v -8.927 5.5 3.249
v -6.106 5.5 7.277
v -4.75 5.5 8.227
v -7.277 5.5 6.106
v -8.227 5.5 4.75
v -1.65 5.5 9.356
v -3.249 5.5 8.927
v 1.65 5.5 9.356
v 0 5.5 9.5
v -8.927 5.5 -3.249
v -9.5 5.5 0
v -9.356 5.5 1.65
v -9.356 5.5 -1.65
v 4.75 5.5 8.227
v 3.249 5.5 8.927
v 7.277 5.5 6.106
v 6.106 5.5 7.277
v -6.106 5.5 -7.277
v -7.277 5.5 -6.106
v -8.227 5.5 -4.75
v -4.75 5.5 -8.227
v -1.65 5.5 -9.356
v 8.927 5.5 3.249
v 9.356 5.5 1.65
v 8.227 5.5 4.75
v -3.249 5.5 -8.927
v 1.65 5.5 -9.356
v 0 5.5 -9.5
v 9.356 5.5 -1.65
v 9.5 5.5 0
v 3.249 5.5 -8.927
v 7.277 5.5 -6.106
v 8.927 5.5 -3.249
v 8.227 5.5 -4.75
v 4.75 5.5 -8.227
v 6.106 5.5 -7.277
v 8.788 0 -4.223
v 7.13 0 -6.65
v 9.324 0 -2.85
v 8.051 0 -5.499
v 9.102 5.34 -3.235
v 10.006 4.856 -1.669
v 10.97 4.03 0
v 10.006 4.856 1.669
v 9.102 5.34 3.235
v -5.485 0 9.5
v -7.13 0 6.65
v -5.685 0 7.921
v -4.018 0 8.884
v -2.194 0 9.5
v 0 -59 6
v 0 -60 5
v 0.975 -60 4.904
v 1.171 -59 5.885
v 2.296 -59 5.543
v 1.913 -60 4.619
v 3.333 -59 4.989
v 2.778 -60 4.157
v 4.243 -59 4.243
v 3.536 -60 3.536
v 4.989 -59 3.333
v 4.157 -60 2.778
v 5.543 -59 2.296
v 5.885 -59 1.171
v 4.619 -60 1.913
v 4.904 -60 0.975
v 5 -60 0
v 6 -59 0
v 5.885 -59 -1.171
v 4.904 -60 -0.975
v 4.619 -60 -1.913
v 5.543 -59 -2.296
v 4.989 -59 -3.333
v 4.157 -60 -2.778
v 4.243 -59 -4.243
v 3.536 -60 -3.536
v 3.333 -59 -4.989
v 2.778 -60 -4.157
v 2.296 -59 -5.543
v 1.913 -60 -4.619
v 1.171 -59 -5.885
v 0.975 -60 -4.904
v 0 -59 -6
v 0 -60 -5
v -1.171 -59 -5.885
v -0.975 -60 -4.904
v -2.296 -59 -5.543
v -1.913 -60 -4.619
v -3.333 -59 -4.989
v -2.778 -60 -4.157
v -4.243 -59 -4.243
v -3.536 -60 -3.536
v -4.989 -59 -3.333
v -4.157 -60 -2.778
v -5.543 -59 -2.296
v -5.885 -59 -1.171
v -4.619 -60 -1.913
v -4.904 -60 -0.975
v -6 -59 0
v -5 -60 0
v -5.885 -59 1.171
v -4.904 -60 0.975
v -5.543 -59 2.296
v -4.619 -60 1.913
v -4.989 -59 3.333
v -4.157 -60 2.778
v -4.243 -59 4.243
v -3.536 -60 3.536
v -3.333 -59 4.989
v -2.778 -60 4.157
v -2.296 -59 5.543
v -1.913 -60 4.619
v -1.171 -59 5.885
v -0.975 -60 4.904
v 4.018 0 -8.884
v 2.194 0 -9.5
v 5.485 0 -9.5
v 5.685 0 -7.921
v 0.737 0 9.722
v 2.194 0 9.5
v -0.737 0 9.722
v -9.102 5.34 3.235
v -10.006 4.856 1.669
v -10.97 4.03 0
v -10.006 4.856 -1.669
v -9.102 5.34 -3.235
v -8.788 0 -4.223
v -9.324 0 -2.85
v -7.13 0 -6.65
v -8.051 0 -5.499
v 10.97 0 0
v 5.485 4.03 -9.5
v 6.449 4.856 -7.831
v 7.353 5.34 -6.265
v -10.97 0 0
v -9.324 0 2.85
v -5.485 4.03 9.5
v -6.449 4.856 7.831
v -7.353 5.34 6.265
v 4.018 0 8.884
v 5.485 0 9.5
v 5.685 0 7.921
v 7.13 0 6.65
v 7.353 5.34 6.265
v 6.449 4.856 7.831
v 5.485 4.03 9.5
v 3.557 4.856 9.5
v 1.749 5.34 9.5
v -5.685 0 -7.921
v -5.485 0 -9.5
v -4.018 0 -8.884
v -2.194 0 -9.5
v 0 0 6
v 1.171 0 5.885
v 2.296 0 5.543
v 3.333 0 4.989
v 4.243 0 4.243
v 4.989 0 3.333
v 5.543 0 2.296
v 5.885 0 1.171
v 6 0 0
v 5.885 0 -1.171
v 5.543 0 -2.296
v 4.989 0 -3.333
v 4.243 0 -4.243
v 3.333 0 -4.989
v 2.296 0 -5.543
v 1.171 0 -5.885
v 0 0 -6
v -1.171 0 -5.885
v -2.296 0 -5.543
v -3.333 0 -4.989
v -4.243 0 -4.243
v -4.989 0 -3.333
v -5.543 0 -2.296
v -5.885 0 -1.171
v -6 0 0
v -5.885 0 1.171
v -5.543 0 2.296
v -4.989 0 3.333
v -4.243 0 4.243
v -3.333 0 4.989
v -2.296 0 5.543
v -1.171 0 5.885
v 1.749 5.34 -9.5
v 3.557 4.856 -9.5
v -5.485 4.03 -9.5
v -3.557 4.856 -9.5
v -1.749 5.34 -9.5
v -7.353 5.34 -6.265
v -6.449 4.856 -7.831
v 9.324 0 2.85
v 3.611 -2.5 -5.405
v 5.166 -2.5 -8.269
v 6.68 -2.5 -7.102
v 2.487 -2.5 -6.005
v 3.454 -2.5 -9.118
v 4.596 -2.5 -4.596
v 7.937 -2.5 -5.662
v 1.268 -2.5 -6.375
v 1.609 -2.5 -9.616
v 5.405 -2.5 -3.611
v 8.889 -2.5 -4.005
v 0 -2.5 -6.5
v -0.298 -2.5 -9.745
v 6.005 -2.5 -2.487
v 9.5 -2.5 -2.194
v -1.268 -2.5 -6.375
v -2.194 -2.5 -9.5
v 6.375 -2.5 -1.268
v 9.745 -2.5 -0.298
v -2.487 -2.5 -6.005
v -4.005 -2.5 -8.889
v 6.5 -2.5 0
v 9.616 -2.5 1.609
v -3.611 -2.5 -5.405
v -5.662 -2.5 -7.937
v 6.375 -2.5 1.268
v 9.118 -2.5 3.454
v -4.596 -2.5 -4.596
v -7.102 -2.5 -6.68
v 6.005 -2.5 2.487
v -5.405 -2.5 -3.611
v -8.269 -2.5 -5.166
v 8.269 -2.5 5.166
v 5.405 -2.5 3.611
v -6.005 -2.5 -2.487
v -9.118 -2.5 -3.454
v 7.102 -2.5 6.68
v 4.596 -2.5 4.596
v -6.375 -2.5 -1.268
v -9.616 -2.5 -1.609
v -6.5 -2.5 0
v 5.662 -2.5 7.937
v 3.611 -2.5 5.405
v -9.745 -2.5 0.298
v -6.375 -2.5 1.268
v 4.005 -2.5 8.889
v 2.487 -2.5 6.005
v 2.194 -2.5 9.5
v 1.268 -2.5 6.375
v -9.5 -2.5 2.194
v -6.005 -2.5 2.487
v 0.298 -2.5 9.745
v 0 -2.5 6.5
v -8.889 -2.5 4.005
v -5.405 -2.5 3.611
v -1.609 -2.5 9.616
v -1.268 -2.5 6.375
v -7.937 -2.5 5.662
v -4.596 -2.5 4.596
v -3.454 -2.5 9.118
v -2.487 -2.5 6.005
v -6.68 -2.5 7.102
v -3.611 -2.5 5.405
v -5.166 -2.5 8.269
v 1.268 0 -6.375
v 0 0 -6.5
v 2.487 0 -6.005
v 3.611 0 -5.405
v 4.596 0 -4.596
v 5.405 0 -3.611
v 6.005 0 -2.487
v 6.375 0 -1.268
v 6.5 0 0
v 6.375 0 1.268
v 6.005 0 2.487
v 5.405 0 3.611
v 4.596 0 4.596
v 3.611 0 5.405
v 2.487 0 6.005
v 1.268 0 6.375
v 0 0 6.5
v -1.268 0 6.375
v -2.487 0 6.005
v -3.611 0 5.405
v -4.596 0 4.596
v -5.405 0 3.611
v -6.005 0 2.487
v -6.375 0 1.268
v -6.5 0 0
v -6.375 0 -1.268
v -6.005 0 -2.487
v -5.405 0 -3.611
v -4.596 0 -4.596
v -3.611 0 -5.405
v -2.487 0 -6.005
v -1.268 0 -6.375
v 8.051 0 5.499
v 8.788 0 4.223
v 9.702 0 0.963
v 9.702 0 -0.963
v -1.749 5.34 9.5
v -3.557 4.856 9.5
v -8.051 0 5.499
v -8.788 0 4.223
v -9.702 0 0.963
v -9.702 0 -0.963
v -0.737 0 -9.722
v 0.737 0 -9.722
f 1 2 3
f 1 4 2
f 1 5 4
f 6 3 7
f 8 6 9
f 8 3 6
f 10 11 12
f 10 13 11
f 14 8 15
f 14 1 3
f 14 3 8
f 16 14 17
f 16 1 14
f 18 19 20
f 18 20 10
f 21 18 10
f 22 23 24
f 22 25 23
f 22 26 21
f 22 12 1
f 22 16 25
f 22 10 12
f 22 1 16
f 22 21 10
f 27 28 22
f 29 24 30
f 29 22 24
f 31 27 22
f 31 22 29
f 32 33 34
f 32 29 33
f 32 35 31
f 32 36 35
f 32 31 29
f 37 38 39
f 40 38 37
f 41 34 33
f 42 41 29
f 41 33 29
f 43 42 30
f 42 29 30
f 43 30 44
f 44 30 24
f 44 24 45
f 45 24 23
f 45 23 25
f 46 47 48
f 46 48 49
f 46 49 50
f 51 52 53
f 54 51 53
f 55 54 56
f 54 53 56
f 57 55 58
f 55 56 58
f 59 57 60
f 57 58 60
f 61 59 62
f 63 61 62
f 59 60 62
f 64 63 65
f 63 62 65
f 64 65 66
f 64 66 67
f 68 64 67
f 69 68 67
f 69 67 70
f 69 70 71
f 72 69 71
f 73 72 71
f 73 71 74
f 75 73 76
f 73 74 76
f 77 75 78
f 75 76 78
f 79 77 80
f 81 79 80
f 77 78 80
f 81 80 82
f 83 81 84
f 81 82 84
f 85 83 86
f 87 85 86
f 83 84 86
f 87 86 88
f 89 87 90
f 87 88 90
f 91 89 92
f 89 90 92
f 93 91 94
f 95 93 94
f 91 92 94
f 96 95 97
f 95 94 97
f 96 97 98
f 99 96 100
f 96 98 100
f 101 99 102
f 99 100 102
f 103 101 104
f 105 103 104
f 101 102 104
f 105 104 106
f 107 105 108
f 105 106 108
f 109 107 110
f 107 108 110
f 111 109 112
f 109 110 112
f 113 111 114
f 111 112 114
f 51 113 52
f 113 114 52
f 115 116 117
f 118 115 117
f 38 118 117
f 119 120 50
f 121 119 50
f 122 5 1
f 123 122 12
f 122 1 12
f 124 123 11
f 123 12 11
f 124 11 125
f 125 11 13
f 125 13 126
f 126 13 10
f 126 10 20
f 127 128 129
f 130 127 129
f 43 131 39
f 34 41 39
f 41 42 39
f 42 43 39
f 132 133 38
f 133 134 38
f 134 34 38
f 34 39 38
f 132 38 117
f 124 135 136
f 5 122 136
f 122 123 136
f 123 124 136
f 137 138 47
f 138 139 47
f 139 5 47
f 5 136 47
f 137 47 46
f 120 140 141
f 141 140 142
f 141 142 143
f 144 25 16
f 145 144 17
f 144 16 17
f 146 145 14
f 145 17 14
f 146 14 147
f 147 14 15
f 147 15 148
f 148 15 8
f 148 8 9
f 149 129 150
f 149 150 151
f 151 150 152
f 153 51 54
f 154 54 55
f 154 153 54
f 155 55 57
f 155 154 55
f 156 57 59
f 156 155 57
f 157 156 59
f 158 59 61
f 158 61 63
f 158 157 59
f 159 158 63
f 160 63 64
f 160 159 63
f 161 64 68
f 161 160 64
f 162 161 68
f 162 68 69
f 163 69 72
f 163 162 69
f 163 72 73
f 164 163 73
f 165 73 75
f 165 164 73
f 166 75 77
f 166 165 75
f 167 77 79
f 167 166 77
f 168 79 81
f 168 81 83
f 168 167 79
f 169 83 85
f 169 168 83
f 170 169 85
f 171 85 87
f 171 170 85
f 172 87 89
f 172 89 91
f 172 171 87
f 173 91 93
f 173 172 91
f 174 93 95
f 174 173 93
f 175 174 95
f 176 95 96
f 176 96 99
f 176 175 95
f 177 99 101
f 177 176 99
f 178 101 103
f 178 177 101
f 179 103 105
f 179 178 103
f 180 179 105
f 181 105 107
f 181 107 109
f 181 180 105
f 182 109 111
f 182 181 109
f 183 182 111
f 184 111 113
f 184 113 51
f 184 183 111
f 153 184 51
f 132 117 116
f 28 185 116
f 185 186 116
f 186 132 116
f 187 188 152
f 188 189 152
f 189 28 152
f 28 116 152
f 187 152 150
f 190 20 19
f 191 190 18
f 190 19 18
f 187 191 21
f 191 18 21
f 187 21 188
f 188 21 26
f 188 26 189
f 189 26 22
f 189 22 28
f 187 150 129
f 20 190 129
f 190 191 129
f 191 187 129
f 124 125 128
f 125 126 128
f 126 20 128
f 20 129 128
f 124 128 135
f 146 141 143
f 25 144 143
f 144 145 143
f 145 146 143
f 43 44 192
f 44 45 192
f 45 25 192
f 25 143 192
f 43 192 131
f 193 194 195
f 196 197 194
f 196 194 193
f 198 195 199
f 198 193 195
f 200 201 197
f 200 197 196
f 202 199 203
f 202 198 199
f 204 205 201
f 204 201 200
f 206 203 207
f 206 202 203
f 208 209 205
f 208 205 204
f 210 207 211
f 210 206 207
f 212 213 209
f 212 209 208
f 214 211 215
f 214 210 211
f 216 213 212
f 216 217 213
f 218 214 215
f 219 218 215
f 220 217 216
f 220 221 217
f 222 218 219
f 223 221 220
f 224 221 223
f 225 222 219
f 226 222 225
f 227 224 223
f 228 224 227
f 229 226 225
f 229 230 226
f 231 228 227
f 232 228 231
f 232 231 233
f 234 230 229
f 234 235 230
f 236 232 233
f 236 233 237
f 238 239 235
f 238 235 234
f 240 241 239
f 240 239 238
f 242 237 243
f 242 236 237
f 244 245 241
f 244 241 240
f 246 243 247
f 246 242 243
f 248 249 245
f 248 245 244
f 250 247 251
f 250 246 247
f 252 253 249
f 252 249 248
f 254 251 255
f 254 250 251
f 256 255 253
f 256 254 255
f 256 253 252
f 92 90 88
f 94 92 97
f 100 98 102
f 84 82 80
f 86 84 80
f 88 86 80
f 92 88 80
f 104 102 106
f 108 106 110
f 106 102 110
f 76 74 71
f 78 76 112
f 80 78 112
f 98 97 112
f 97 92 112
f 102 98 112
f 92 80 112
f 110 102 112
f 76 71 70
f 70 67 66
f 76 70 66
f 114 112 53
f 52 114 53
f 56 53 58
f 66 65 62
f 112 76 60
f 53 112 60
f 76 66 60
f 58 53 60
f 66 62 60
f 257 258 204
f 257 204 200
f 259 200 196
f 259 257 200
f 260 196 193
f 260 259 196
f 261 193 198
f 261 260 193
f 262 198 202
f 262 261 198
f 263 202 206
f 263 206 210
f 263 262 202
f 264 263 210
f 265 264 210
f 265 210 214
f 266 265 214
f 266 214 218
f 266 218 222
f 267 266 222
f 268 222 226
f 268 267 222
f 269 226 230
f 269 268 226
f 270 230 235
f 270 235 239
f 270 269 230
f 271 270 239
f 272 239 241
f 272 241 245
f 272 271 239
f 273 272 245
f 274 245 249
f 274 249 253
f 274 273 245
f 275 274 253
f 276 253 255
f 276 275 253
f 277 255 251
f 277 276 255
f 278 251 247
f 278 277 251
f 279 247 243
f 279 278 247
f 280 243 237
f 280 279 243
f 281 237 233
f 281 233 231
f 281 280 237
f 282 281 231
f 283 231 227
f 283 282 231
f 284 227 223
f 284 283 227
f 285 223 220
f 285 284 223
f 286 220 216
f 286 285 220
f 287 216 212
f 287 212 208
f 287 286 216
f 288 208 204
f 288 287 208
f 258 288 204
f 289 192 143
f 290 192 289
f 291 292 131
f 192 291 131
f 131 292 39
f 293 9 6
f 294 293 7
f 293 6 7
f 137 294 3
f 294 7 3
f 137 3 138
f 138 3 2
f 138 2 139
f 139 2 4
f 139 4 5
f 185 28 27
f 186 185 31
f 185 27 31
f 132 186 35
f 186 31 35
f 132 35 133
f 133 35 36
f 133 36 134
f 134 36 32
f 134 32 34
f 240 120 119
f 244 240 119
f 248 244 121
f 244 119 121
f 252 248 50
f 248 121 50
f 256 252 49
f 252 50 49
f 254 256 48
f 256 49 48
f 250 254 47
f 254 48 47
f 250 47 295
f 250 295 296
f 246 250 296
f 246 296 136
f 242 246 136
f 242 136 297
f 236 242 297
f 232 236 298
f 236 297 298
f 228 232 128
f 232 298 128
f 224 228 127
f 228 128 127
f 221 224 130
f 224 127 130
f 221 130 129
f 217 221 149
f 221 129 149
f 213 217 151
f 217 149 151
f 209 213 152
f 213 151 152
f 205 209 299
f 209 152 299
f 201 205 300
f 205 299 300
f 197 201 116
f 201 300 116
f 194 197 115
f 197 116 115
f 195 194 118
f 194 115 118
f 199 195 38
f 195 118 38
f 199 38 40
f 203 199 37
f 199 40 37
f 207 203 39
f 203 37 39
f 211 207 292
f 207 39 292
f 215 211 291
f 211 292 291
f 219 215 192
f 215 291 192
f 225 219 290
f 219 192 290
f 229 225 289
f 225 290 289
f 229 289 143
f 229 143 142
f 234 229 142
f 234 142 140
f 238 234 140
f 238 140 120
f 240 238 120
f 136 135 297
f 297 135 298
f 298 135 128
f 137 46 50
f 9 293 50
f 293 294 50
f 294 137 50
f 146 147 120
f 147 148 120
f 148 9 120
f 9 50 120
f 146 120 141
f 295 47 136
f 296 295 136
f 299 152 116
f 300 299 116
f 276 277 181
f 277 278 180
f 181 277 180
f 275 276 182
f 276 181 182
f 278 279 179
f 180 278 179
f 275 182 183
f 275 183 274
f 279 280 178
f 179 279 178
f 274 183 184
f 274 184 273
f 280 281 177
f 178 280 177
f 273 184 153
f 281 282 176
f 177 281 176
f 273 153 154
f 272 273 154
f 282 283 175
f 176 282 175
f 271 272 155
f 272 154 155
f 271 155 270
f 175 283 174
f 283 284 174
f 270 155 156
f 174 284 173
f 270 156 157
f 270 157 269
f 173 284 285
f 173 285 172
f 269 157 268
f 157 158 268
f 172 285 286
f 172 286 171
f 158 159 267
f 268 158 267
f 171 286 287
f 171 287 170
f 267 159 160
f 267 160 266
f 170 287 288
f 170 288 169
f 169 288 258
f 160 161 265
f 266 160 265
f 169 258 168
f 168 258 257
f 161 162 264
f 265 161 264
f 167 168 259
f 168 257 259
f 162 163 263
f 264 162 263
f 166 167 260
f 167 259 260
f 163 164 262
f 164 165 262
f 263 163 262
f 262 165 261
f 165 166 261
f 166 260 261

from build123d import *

# Parameters (mm, degrees)
SZKIC1_R                    = 6
DODANIE_WYCI_GNI_CIE1_DEPTH = 60
DODANIE_WYCI_GNI_CIE2_DEPTH = 5.5
SFAZOWANIE1_SIZE            = 1
SZKIC6_R                    = 9.75
SZKIC6_R_2                  = 6.5
DODANIE_WYCI_GNI_CIE3_DEPTH = 2.5


with BuildPart() as part:
    # Szkic1 → Dodanie-wyciągnięcie1 (new body)
    with BuildSketch(Plane(origin=(0, 0, 0), x_dir=(1, 0, 0), z_dir=(0, 1, 0))):
        with Locations(Location((0, 0, 0), (0, 0, 270))):
            Circle(SZKIC1_R)
    extrude(amount=-DODANIE_WYCI_GNI_CIE1_DEPTH)

    # Szkic2 → Dodanie-wyciągnięcie2 (add)
    with BuildSketch(Plane(origin=(0, 0, 0), x_dir=(1, 0, 0), z_dir=(0, 1, 0))):
        Polygon((10.969655115, 0), (5.484827557, 9.5), (-5.484827557, 9.5), (-10.969655115, 0), (-5.484827557, -9.5), (5.484827557, -9.5), align=None)
    extrude(amount=DODANIE_WYCI_GNI_CIE2_DEPTH)

    # Szkic4 → Wycięcie-obrót1 (revolve, cut)
    with BuildSketch(Plane.XY):
        Polygon((10.969655115, 4.030344885), (9.5, 5.5), (10.969655115, 5.5), align=None)
    revolve(axis=Axis((0, 5.5, 0), (0, -1, 0)), mode=Mode.SUBTRACT)

    # Sfazowanie1
    sfazowanie1_edges = [part.edges().sort_by_distance(p)[0] for p in [
        (0, -60, -6),
    ]]
    chamfer(sfazowanie1_edges, length=SFAZOWANIE1_SIZE)

    # Szkic6 → Dodanie-wyciągnięcie3 (add)
    with BuildSketch(Plane.XZ):
        with Locations(Location((0, 0, 0), (0, 0, 76.997175533))):
            Circle(SZKIC6_R)
        with Locations(Location((0, 0, 0), (0, 0, 270))):
            Circle(SZKIC6_R_2, mode=Mode.SUBTRACT)
    extrude(amount=DODANIE_WYCI_GNI_CIE3_DEPTH)


solid = part.part
